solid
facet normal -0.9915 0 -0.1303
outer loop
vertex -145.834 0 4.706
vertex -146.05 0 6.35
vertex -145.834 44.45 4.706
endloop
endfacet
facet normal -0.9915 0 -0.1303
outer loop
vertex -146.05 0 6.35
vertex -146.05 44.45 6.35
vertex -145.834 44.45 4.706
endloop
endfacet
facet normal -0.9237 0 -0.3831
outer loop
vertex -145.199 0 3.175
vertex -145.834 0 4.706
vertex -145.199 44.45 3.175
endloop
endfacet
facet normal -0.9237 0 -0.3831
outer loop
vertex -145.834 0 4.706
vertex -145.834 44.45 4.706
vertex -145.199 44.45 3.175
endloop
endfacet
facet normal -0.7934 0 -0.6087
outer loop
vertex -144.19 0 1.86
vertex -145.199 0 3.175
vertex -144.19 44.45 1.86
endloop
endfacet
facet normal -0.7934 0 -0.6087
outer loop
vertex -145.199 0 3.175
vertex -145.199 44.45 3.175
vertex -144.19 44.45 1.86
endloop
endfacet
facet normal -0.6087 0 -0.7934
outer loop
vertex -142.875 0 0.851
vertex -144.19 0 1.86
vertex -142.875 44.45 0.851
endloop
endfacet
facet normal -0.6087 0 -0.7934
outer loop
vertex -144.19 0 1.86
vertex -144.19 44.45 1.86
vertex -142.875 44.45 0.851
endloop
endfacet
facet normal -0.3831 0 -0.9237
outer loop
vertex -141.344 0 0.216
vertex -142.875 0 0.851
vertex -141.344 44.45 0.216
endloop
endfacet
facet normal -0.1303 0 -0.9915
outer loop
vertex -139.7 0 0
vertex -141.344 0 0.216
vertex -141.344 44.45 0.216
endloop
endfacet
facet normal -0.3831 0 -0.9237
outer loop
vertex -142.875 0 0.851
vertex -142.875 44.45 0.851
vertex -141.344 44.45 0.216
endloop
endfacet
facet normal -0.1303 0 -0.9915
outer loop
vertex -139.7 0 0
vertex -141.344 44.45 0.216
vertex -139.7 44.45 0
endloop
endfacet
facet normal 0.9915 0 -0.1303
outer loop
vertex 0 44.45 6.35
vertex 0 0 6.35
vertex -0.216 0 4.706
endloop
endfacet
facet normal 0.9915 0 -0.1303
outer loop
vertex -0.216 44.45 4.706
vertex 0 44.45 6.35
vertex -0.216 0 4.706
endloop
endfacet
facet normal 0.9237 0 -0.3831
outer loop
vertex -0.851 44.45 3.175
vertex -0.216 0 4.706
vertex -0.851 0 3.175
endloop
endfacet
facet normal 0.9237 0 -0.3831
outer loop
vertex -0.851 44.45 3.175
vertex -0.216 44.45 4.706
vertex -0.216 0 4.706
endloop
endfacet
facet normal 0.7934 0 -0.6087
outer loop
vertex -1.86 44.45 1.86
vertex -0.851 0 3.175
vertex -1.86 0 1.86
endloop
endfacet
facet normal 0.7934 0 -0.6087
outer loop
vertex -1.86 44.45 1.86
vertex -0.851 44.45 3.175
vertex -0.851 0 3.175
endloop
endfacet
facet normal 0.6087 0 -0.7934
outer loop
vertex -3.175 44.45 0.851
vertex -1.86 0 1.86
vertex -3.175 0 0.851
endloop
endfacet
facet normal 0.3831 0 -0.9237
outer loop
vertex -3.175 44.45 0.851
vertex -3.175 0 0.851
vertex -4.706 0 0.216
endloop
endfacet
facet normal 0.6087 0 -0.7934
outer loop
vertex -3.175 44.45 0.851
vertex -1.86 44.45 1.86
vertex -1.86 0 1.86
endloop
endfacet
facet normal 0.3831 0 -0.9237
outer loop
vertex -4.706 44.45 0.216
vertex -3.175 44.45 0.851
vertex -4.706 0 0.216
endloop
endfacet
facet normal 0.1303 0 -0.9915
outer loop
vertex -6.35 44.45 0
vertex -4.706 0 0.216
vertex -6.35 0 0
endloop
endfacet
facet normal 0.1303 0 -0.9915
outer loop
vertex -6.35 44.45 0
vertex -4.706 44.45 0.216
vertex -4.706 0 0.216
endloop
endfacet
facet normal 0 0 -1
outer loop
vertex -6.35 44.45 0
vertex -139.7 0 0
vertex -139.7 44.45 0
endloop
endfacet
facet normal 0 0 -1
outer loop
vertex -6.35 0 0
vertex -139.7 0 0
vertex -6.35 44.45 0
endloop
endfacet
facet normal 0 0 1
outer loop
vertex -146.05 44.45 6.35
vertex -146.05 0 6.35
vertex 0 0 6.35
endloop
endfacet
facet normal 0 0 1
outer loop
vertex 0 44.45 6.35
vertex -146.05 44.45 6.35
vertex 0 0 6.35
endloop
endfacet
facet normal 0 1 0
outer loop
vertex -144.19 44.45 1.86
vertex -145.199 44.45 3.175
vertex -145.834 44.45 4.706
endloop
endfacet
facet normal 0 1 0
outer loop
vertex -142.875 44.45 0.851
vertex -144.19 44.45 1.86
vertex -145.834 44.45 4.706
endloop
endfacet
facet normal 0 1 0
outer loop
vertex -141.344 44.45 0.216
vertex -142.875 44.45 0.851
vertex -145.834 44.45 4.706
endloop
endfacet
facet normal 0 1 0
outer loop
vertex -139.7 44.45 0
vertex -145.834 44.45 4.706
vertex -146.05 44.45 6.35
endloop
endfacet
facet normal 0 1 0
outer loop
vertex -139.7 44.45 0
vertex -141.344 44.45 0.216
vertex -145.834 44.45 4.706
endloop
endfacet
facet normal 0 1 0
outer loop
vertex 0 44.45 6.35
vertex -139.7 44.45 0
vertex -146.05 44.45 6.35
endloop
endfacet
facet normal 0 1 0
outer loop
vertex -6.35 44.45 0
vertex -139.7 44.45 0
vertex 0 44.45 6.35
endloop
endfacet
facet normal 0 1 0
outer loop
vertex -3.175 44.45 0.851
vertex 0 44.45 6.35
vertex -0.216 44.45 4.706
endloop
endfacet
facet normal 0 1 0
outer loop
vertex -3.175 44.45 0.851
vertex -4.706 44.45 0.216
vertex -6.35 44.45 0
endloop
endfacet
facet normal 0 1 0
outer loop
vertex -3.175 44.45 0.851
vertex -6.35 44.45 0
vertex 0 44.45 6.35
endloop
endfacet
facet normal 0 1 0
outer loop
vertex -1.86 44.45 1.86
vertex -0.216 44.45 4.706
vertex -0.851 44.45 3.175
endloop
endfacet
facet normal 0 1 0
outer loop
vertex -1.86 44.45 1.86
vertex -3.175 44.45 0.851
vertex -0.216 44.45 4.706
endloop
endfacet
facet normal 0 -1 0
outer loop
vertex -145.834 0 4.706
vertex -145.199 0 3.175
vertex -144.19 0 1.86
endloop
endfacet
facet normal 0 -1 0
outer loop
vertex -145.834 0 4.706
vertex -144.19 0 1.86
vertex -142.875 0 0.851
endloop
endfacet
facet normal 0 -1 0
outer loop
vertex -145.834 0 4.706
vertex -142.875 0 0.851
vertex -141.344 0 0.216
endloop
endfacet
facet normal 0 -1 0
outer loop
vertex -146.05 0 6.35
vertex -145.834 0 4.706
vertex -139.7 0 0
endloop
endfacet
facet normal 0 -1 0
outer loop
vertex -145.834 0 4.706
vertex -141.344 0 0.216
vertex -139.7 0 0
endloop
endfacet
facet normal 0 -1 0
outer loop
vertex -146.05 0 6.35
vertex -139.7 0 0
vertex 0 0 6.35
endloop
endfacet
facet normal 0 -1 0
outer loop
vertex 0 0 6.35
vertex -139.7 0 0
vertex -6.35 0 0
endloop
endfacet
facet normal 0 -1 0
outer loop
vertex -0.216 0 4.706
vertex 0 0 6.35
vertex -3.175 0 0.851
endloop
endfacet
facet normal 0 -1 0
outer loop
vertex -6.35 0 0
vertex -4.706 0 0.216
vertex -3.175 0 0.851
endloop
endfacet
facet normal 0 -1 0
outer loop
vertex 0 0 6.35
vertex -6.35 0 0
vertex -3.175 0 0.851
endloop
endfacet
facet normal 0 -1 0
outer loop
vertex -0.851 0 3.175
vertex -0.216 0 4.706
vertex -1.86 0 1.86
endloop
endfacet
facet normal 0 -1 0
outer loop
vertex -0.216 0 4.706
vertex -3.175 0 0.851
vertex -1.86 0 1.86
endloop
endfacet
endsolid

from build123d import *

# Parameters (mm, degrees)
SKETCH1_W           = 146.05
SKETCH1_H           = 6.35
BOSS_EXTRUDE1_DEPTH = 44.45
FILLET1_R           = 6.35


with BuildPart() as part:
    # Sketch1 → Boss-Extrude1 (new body)
    with BuildSketch(Plane(origin=(0, 0, 0), x_dir=(1, 0, 0), z_dir=(0, 1, 0))):
        with Locations((-73.025, -3.175)):
            Rectangle(SKETCH1_W, SKETCH1_H)
    extrude(amount=BOSS_EXTRUDE1_DEPTH)

    # Fillet1
    fillet1_edges = [part.edges().sort_by_distance(p)[0] for p in [
        (-146.05, 22.225, 0),
        (0, 22.225, 0),
    ]]
    fillet(fillet1_edges, radius=FILLET1_R - 0.0001)  # a hair under: the kernel refuses the full size


solid = part.part
